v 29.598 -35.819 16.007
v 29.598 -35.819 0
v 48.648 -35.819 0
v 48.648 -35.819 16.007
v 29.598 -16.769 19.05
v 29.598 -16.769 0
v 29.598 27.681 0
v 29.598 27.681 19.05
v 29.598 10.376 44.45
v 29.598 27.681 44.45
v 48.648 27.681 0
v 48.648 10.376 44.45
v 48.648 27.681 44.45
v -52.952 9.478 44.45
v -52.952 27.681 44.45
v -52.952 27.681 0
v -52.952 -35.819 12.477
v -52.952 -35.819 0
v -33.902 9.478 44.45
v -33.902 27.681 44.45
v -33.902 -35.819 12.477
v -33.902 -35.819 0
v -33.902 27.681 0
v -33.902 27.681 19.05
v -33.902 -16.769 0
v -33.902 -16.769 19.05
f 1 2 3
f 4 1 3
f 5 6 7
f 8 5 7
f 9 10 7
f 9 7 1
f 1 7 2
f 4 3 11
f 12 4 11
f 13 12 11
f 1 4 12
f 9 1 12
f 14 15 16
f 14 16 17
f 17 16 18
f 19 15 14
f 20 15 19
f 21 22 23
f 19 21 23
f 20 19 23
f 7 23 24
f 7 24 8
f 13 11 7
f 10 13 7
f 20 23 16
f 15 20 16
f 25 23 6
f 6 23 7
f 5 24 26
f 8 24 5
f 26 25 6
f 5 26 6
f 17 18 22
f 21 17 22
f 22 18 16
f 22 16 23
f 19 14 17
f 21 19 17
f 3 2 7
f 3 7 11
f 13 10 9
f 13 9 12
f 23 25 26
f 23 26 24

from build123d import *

# Parameters (mm, degrees)
F1_DEPTH = 44.45
F0_W     = 63.5
F0_H     = 44.45
F2_DEPTH = 19.05
F4_DEPTH = 25.4
F6_DEPTH = 25.4


with BuildPart() as f1:
    # F0 (on Top) → F1 (new body)
    with BuildSketch(Plane.XY):
        Polygon((48.648207, 27.681347), (29.598207, 27.681347), (29.598207, -16.768653), (29.598207, -35.818653), (48.648207, -35.818653), align=None)
        Polygon((-33.901793, -16.768653), (-33.901793, 27.681347), (-52.951793, 27.681347), (-52.951793, -35.818653), (-33.901793, -35.818653), align=None)
    extrude(amount=F1_DEPTH)

    # F3 (on face) → F4 (cut)
    with BuildSketch(Plane(origin=(-52.951793, 0, 0), x_dir=(0, -1, 0), z_dir=(-1, 0, 0))):
        Polygon((-9.477809, 44.45), (35.818653, 12.477029), (35.818653, 44.45), align=None)
    extrude(amount=-F4_DEPTH, mode=Mode.SUBTRACT)

    # F5 (on face) → F6 (cut)
    with BuildSketch(Plane.YZ.offset(48.648207)):
        Polygon((-35.818653, 44.45), (-35.818653, 16.007107), (10.376319, 44.45), align=None)
    extrude(amount=-F6_DEPTH, mode=Mode.SUBTRACT)


with BuildPart() as f2:
    # F0 (on Top) → F2 (new body)
    with BuildSketch(Plane.XY):
        with Locations((-2.151793, 5.456347)):
            Rectangle(F0_W, F0_H)
    extrude(amount=F2_DEPTH)


solid = Compound([f1.part, f2.part])
